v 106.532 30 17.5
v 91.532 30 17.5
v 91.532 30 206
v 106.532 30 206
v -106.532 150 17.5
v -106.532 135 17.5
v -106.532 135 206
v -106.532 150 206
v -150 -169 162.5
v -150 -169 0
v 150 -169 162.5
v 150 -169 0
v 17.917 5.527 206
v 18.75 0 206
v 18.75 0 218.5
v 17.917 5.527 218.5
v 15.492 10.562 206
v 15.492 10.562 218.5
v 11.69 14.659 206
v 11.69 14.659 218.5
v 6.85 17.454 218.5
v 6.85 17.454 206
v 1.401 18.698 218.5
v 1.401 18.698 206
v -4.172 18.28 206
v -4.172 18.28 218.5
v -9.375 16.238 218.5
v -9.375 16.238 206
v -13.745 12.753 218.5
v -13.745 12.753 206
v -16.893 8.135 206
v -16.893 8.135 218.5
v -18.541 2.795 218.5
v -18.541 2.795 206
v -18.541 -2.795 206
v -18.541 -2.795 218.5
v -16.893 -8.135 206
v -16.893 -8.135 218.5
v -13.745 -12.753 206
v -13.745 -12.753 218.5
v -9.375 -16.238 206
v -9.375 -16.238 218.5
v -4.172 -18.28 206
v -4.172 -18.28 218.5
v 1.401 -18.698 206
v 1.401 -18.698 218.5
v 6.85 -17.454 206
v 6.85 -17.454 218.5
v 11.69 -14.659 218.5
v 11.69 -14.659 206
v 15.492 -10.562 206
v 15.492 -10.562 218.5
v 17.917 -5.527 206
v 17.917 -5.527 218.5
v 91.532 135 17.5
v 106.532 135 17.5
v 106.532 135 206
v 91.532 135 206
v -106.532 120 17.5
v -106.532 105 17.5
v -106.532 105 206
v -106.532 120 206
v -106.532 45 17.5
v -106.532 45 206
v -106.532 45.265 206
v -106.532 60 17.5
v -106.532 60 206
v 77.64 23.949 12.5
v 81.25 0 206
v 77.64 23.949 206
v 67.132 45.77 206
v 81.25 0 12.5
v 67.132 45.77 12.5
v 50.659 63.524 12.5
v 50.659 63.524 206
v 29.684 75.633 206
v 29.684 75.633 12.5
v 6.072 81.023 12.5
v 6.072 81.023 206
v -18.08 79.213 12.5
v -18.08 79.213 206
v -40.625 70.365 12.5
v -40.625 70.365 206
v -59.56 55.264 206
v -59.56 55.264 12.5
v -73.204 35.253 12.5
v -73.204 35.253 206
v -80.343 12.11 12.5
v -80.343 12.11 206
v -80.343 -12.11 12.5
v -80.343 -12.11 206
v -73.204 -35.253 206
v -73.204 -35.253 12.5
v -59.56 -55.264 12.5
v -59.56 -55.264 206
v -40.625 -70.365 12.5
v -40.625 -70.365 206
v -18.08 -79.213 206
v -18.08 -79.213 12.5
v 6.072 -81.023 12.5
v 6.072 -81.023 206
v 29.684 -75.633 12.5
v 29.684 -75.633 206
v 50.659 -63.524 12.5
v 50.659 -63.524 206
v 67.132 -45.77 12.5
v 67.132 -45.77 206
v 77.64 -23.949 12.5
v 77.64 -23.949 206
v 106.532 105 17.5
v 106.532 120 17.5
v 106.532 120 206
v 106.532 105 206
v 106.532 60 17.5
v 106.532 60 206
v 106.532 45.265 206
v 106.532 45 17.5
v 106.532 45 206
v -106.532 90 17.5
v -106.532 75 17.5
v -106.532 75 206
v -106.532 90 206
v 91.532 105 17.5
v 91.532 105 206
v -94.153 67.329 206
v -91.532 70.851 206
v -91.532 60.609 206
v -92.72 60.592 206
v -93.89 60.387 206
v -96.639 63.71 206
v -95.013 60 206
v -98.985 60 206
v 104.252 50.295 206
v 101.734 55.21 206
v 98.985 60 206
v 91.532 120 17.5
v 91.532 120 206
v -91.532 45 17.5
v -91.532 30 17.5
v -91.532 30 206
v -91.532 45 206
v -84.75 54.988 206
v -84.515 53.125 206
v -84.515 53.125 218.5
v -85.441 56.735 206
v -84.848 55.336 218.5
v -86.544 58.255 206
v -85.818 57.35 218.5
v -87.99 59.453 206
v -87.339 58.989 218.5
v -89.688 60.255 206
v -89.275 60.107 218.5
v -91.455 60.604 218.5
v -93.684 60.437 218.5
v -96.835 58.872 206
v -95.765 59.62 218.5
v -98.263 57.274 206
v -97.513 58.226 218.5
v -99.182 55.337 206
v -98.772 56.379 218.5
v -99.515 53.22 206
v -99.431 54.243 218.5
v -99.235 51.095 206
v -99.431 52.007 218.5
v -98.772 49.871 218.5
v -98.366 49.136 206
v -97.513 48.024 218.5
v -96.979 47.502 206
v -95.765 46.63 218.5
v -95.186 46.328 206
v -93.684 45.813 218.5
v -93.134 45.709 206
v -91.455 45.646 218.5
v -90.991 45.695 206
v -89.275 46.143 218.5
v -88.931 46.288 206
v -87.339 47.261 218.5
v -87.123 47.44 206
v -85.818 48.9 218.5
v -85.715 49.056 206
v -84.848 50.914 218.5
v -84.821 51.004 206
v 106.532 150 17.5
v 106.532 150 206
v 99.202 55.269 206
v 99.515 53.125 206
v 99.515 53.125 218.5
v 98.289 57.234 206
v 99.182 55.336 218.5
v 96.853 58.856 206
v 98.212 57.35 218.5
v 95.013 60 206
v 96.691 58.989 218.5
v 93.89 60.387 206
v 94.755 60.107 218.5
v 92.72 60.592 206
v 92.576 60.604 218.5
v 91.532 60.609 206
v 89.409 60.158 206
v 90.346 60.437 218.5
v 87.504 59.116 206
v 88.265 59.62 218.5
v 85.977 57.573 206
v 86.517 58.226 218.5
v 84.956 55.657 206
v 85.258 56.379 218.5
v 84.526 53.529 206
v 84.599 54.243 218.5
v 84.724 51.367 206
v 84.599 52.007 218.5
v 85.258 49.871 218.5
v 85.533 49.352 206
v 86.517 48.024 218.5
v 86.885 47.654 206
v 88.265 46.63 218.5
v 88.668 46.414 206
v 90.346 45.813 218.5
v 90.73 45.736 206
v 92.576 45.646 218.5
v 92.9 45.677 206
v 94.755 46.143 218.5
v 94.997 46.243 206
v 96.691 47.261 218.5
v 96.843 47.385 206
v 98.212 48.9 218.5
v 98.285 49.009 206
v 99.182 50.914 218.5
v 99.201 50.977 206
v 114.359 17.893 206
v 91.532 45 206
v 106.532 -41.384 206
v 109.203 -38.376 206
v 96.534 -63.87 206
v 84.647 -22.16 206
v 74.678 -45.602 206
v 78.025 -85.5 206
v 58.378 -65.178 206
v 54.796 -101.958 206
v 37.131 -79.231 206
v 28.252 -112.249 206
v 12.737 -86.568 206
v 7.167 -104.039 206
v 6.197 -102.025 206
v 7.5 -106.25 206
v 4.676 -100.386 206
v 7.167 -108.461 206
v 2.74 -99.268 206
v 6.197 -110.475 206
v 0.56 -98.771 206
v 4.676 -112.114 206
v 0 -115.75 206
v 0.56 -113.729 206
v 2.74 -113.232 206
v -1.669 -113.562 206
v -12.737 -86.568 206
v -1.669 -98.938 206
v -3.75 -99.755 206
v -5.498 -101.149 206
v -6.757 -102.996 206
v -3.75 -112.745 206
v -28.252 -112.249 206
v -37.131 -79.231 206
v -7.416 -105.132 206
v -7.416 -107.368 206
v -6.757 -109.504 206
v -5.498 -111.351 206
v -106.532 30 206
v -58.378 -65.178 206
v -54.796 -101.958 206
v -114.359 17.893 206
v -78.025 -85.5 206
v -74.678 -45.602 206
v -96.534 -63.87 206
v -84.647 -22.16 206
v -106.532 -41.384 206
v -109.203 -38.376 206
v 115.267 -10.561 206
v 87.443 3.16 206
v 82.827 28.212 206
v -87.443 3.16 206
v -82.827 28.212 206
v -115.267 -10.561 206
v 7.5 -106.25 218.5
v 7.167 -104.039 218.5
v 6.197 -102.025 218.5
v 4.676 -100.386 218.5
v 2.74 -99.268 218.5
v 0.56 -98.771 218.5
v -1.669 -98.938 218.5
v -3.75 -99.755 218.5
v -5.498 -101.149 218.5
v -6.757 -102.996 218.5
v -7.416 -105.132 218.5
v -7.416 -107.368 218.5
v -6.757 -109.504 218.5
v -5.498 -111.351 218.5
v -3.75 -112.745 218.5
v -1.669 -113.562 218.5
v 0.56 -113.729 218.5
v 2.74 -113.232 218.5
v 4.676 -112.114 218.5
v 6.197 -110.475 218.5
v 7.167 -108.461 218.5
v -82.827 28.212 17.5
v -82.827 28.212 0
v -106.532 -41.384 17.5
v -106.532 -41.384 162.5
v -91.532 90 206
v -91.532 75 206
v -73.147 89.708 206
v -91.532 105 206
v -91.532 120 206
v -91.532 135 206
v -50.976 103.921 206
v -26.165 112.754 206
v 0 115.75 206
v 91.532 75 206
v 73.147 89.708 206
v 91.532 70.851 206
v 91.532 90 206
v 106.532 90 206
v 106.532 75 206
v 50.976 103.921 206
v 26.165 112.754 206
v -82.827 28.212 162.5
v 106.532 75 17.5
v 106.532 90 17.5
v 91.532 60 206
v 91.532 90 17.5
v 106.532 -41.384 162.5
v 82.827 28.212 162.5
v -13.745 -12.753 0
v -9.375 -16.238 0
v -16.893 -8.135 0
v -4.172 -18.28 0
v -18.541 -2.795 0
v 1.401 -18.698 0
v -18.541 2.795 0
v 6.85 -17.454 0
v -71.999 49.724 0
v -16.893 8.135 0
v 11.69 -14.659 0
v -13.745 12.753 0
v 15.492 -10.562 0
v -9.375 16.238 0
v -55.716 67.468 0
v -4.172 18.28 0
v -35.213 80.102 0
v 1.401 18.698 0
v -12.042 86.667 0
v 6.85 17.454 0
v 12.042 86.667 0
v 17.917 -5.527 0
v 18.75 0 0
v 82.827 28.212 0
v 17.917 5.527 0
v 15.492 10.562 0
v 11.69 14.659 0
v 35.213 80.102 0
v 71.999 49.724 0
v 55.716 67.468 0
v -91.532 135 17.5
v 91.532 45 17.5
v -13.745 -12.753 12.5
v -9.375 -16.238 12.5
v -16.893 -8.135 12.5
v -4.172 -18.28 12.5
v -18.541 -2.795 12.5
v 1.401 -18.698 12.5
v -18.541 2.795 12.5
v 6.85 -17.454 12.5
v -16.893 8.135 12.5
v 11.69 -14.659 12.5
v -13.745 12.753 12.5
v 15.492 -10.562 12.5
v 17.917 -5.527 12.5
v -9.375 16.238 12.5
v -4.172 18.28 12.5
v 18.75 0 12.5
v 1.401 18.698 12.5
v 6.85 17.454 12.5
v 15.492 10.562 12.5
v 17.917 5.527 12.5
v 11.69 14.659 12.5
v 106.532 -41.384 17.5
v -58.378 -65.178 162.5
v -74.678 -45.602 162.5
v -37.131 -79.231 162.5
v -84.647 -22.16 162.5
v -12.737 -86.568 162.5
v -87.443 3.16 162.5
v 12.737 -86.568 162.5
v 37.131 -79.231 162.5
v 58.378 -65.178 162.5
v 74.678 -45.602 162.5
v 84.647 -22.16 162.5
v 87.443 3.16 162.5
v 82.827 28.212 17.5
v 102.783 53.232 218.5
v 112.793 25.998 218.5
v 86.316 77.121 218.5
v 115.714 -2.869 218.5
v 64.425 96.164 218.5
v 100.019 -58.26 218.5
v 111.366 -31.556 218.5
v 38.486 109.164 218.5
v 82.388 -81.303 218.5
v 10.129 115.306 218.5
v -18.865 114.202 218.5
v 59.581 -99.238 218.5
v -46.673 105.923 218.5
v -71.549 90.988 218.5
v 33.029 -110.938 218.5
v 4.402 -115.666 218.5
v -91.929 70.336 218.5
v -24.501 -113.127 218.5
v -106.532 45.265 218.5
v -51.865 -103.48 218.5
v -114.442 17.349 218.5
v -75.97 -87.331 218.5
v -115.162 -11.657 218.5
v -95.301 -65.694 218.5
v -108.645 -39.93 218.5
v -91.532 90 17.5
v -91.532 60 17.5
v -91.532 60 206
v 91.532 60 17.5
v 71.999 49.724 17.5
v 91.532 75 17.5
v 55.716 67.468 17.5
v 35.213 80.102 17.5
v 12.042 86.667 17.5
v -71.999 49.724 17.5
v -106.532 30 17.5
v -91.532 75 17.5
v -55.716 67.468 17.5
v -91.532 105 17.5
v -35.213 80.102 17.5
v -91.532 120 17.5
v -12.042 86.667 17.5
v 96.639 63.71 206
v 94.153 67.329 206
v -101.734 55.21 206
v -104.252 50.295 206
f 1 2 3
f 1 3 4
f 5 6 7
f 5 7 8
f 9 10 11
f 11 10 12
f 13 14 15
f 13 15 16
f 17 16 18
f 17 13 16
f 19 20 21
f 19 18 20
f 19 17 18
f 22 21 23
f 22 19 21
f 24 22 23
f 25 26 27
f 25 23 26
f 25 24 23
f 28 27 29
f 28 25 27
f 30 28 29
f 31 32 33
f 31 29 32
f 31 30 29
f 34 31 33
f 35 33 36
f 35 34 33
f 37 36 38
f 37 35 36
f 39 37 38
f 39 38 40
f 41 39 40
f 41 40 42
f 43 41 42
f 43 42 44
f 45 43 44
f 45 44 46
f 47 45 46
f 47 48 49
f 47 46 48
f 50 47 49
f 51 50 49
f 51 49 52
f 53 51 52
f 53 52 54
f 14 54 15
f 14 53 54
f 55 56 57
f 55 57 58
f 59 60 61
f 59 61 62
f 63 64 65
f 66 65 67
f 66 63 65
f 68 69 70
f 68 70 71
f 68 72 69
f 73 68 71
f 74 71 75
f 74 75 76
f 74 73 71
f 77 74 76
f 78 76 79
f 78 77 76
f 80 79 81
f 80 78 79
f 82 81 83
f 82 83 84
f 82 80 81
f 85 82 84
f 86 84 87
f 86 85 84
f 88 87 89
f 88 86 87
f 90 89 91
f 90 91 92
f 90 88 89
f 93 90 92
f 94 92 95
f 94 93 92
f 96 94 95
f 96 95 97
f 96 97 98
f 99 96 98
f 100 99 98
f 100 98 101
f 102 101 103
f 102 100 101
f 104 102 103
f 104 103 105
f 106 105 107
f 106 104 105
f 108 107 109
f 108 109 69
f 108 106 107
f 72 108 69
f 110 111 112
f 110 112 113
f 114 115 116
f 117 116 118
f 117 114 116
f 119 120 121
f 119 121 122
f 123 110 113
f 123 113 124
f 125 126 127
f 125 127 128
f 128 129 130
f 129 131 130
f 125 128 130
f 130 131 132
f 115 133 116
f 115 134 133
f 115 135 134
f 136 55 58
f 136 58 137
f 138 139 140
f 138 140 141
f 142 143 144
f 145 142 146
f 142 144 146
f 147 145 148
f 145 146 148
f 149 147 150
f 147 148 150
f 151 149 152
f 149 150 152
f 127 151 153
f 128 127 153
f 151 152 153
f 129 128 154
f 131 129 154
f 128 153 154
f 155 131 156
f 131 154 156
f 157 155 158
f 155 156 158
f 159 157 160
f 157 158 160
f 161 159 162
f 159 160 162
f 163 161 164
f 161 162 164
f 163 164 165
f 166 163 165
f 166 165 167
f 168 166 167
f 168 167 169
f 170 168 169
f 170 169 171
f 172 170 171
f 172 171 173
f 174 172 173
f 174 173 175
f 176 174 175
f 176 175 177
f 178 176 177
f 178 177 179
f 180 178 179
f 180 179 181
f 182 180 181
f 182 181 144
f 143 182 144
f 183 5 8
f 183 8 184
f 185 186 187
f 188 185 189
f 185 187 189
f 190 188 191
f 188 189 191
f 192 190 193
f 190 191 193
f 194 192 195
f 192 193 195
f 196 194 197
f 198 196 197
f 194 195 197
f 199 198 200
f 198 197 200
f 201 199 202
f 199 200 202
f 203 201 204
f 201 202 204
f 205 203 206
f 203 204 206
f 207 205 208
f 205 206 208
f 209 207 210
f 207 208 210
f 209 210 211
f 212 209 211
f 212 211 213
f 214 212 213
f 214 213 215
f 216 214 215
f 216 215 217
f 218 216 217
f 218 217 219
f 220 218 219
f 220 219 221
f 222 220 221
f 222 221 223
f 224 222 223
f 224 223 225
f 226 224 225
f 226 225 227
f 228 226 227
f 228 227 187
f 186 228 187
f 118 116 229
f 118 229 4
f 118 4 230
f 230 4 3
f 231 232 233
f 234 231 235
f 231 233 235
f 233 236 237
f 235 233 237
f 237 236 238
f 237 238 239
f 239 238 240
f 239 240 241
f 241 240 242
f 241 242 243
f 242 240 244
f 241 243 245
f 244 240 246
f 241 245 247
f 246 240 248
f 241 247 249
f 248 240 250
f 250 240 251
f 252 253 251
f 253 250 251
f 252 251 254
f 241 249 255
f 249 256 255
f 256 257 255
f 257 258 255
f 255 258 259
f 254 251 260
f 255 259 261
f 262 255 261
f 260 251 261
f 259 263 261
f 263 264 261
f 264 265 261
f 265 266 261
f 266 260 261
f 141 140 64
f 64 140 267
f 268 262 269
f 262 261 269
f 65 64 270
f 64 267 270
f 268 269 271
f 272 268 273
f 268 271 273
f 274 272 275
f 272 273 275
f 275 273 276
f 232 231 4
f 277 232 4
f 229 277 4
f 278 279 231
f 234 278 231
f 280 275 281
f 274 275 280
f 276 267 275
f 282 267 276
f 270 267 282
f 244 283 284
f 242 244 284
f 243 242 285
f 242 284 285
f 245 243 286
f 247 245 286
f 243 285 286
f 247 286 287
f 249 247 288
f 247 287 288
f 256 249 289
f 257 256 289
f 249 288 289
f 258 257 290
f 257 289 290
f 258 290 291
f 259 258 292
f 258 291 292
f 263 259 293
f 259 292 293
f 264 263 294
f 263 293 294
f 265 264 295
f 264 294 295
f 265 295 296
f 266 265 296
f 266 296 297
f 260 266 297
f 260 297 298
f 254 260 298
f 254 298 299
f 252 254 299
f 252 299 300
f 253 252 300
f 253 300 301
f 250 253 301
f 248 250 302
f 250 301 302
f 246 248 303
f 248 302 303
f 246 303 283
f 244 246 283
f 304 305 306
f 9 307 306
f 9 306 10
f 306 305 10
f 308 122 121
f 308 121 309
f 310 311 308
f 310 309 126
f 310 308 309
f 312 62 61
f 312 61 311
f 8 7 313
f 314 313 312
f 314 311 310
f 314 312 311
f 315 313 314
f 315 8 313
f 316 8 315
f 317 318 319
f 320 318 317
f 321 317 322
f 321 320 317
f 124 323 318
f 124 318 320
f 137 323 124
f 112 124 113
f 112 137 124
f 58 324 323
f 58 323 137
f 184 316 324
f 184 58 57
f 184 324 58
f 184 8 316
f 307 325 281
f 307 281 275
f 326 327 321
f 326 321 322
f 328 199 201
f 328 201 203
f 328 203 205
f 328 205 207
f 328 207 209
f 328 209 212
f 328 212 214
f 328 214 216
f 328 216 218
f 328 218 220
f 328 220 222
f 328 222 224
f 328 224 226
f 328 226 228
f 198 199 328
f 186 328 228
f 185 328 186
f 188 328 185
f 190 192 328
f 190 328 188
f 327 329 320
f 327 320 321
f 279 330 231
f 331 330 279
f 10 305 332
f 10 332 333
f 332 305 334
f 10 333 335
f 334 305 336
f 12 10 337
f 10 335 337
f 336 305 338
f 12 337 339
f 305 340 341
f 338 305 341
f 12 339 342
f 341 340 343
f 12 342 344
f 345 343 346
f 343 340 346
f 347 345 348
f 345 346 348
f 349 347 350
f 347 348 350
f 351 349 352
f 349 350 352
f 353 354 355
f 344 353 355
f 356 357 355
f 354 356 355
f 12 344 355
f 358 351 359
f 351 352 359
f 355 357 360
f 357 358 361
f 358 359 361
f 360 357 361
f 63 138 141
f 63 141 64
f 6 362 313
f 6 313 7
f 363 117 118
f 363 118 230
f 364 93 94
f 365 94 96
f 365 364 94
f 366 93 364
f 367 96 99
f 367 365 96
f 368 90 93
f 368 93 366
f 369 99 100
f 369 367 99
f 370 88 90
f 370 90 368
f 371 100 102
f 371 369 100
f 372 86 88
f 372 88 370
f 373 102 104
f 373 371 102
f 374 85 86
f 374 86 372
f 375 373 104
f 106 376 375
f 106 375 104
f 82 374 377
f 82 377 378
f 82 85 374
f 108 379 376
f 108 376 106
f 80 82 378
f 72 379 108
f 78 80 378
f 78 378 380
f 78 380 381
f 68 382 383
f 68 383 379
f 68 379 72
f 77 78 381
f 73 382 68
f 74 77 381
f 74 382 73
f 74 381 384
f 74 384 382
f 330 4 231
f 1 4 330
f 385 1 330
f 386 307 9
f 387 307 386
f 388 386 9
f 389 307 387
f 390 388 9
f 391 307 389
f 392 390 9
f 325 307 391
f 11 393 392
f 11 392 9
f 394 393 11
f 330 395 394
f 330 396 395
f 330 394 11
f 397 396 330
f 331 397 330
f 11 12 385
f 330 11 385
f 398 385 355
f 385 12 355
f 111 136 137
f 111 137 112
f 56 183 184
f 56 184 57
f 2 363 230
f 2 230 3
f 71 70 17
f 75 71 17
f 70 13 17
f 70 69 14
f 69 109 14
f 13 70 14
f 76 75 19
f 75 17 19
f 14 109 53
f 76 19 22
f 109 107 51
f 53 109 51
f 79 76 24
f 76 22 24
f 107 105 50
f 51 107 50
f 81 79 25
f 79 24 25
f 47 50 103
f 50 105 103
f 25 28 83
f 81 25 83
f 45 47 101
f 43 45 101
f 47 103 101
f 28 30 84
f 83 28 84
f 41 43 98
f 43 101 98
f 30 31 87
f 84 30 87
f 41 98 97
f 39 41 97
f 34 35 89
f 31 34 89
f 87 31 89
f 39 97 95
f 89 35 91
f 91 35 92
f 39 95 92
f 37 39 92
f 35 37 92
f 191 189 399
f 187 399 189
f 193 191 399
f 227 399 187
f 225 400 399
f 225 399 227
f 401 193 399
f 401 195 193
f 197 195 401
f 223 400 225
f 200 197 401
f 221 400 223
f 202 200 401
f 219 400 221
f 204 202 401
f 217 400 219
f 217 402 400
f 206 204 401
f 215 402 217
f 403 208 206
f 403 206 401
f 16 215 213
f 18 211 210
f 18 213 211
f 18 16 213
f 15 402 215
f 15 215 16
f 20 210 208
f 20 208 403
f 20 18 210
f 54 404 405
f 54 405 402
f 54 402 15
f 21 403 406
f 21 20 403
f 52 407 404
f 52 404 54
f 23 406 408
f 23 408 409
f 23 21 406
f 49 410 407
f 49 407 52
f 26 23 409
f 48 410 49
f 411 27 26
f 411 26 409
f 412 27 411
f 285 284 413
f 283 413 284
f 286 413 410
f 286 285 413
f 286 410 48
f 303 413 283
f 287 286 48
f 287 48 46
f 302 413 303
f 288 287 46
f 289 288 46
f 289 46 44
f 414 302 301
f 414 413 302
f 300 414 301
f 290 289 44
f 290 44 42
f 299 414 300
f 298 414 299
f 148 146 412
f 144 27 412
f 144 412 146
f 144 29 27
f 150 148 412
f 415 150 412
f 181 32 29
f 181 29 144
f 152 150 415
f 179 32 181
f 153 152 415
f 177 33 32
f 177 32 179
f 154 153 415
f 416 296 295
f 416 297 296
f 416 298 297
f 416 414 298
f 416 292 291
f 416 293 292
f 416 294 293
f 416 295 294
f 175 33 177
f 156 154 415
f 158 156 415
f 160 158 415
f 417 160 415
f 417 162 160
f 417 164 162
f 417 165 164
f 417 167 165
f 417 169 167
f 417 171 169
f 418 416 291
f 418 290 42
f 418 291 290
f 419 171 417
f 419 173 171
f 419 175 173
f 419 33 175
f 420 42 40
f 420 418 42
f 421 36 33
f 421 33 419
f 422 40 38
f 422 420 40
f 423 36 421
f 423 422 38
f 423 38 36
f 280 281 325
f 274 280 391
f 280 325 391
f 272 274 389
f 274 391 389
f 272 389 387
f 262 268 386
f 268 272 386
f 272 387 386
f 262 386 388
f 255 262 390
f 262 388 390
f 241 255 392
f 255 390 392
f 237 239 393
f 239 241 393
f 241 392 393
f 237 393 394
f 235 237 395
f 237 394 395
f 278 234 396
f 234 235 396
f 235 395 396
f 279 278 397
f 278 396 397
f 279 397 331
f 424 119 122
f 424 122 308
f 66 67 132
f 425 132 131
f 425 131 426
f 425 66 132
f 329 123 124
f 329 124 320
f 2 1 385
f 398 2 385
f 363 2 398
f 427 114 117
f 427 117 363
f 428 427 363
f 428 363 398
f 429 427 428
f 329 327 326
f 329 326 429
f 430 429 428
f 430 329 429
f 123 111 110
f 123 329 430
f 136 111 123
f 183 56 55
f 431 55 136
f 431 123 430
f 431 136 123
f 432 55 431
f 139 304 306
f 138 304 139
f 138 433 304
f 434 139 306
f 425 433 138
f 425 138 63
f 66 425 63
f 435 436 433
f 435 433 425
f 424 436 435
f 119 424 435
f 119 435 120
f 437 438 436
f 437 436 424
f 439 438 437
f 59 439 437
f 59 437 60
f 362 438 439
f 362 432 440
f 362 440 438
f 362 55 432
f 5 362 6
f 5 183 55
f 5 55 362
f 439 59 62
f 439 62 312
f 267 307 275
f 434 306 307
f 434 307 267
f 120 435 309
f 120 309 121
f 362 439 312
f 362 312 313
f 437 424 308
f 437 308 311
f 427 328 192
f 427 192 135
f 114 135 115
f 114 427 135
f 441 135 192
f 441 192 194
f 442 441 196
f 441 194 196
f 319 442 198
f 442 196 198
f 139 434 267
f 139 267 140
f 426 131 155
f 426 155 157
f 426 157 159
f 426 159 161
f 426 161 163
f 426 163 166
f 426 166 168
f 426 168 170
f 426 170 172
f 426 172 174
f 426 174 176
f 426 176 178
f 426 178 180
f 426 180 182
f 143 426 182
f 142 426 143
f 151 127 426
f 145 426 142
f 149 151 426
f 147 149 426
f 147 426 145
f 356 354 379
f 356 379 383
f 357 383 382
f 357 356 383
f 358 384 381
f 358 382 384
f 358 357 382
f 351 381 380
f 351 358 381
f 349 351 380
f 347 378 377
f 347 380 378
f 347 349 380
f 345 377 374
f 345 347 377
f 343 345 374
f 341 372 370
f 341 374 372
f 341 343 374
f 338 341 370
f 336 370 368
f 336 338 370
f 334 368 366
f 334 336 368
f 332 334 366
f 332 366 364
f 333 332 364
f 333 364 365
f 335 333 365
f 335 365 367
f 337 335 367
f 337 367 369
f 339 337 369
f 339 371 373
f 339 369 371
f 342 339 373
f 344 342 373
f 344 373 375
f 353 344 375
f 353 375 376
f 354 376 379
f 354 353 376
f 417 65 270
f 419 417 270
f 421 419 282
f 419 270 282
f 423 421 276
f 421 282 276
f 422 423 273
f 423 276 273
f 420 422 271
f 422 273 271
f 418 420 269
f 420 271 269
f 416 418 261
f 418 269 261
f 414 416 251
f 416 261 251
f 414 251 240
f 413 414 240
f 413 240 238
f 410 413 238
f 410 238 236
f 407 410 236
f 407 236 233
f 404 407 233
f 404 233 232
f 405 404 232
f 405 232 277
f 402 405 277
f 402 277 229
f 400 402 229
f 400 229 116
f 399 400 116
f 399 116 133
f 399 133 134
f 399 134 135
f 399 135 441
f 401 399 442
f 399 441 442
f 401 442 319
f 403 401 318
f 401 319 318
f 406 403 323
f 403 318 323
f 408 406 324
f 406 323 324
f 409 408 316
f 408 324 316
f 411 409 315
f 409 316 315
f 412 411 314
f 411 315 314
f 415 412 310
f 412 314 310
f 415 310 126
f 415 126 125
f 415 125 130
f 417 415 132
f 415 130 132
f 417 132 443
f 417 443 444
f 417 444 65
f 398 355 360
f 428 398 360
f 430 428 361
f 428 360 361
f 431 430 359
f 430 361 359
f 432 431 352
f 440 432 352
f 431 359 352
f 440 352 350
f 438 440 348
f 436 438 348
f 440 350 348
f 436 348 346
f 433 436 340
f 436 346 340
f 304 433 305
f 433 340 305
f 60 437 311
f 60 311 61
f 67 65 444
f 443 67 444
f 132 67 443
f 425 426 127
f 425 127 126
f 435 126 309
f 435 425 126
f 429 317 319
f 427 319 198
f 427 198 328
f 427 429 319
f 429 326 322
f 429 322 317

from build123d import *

# Parameters (mm, degrees)
BOSS_EXTRUDE1_DEPTH      = 162.5
BOSS_EXTRUDE2_DEPTH      = 43.5
BOSS_EXTRUDE2_DEPTH_BACK = 145
SKETCH3_R                = 81.25
CUT_EXTRUDE1_DEPTH       = 150
SKETCH6_R                = 87.5
SKETCH6_R_2              = 81.25
BOSS_EXTRUDE4_DEPTH      = 43.5
SKETCH7_R                = 115.75
BOSS_EXTRUDE5_DEPTH      = 12.5
SKETCH8_R                = 7.5
CUT_EXTRUDE2_DEPTH       = 12.5
CUT_EXTRUDE3_DEPTH       = 315.329842681
CUT_EXTRUDE3_DEPTH_BACK  = 315.329842681
SKETCH9_R                = 18.75


with BuildPart() as part:
    # Sketch1 → Boss-Extrude1 (new body)
    with BuildSketch(Plane.XY):
        with BuildLine():
            Line((-150, -169), (150, -169))
            Line((150, -169), (82.827141263, 28.211959701))
            ThreePointArc((82.827141263, 28.211959701), (0, 87.5), (-82.827141263, 28.211959701))
            Line((-82.827141263, 28.211959701), (-150, -169))
        make_face()
    extrude(amount=BOSS_EXTRUDE1_DEPTH)

    # Sketch2 → Boss-Extrude2 (add, two sides: drawn at the far end of the back side and taken through both)
    with BuildSketch(Plane.XY.offset(162.5).offset(-BOSS_EXTRUDE2_DEPTH_BACK)):
        with BuildLine():
            Line((-106.53243077, 150), (106.53243077, 150))
            Line((106.53243077, 150), (106.53243077, 135))
            Line((106.53243077, 135), (91.53243077, 135))
            Line((91.53243077, 135), (91.53243077, 120))
            Line((91.53243077, 120), (106.53243077, 120))
            Line((106.53243077, 120), (106.53243077, 105))
            Line((106.53243077, 105), (91.53243077, 105))
            Line((91.53243077, 105), (91.53243077, 90))
            Line((91.53243077, 90), (106.53243077, 90))
            Line((106.53243077, 90), (106.53243077, 75))
            Line((106.53243077, 75), (91.53243077, 75))
            Line((91.53243077, 75), (91.53243077, 60))
            Line((91.53243077, 60), (106.53243077, 60))
            Line((106.53243077, 60), (106.53243077, 45))
            Line((106.53243077, 45), (91.53243077, 45))
            Line((91.53243077, 45), (91.53243077, 30))
            Line((91.53243077, 30), (106.53243077, 30))
            Line((106.53243077, 30), (106.53243077, -41.384104643))
            Line((106.53243077, -41.384104643), (82.827141263, 28.211959701))
            ThreePointArc((82.827141263, 28.211959701), (0, 87.5), (-82.827141263, 28.211959701))
            Line((-82.827141263, 28.211959701), (-106.53243077, -41.384104643))
            Line((-106.53243077, -41.384104643), (-106.53243077, 30))
            Line((-106.53243077, 30), (-91.53243077, 30))
            Line((-91.53243077, 30), (-91.53243077, 45))
            Line((-91.53243077, 45), (-106.53243077, 45))
            Line((-106.53243077, 45), (-106.53243077, 60))
            Line((-106.53243077, 60), (-91.53243077, 60))
            Line((-91.53243077, 60), (-91.53243077, 75))
            Line((-91.53243077, 75), (-106.53243077, 75))
            Line((-106.53243077, 75), (-106.53243077, 90))
            Line((-106.53243077, 90), (-91.53243077, 90))
            Line((-91.53243077, 90), (-91.53243077, 105))
            Line((-91.53243077, 105), (-106.53243077, 105))
            Line((-106.53243077, 105), (-106.53243077, 120))
            Line((-106.53243077, 120), (-91.53243077, 120))
            Line((-91.53243077, 120), (-91.53243077, 135))
            Line((-91.53243077, 135), (-106.53243077, 135))
            Line((-106.53243077, 135), (-106.53243077, 150))
        make_face()
    extrude(amount=BOSS_EXTRUDE2_DEPTH + BOSS_EXTRUDE2_DEPTH_BACK)

    # Sketch3 → Cut-Extrude1 (cut)
    with BuildSketch(Plane.XY.offset(162.5)):
        Circle(SKETCH3_R)
    extrude(amount=-CUT_EXTRUDE1_DEPTH, mode=Mode.SUBTRACT)

    # Sketch6 → Boss-Extrude4 (add, through all)
    with BuildSketch(Plane.XY.offset(162.5)):
        Circle(SKETCH6_R)
        Circle(SKETCH6_R_2, mode=Mode.SUBTRACT)
    extrude(amount=BOSS_EXTRUDE4_DEPTH)

    # Sketch7 → Boss-Extrude5 (add)
    with BuildSketch(Plane.XY.offset(206)):
        with Locations(Location((0, 0, 0), (0, 0, 156.979731296))):
            Circle(SKETCH7_R)
    extrude(amount=BOSS_EXTRUDE5_DEPTH)

    # Sketch8 → Cut-Extrude2 (cut)
    with BuildSketch(Plane.XY.offset(218.5)):
        with Locations((0, -106.25)):
            Circle(SKETCH8_R)
        with Locations((-92.015199152, 53.125)):
            Circle(SKETCH8_R)
        with Locations((92.015199152, 53.125)):
            Circle(SKETCH8_R)
    extrude(amount=-CUT_EXTRUDE2_DEPTH, mode=Mode.SUBTRACT)

    # Sketch9 → Cut-Extrude3 (cut, two sides: drawn at the far end of the back side and taken through both)
    with BuildSketch(Plane.XY.offset(218.5).offset(-CUT_EXTRUDE3_DEPTH_BACK)):
        Circle(SKETCH9_R)
    extrude(amount=CUT_EXTRUDE3_DEPTH + CUT_EXTRUDE3_DEPTH_BACK, mode=Mode.SUBTRACT)


solid = part.part
